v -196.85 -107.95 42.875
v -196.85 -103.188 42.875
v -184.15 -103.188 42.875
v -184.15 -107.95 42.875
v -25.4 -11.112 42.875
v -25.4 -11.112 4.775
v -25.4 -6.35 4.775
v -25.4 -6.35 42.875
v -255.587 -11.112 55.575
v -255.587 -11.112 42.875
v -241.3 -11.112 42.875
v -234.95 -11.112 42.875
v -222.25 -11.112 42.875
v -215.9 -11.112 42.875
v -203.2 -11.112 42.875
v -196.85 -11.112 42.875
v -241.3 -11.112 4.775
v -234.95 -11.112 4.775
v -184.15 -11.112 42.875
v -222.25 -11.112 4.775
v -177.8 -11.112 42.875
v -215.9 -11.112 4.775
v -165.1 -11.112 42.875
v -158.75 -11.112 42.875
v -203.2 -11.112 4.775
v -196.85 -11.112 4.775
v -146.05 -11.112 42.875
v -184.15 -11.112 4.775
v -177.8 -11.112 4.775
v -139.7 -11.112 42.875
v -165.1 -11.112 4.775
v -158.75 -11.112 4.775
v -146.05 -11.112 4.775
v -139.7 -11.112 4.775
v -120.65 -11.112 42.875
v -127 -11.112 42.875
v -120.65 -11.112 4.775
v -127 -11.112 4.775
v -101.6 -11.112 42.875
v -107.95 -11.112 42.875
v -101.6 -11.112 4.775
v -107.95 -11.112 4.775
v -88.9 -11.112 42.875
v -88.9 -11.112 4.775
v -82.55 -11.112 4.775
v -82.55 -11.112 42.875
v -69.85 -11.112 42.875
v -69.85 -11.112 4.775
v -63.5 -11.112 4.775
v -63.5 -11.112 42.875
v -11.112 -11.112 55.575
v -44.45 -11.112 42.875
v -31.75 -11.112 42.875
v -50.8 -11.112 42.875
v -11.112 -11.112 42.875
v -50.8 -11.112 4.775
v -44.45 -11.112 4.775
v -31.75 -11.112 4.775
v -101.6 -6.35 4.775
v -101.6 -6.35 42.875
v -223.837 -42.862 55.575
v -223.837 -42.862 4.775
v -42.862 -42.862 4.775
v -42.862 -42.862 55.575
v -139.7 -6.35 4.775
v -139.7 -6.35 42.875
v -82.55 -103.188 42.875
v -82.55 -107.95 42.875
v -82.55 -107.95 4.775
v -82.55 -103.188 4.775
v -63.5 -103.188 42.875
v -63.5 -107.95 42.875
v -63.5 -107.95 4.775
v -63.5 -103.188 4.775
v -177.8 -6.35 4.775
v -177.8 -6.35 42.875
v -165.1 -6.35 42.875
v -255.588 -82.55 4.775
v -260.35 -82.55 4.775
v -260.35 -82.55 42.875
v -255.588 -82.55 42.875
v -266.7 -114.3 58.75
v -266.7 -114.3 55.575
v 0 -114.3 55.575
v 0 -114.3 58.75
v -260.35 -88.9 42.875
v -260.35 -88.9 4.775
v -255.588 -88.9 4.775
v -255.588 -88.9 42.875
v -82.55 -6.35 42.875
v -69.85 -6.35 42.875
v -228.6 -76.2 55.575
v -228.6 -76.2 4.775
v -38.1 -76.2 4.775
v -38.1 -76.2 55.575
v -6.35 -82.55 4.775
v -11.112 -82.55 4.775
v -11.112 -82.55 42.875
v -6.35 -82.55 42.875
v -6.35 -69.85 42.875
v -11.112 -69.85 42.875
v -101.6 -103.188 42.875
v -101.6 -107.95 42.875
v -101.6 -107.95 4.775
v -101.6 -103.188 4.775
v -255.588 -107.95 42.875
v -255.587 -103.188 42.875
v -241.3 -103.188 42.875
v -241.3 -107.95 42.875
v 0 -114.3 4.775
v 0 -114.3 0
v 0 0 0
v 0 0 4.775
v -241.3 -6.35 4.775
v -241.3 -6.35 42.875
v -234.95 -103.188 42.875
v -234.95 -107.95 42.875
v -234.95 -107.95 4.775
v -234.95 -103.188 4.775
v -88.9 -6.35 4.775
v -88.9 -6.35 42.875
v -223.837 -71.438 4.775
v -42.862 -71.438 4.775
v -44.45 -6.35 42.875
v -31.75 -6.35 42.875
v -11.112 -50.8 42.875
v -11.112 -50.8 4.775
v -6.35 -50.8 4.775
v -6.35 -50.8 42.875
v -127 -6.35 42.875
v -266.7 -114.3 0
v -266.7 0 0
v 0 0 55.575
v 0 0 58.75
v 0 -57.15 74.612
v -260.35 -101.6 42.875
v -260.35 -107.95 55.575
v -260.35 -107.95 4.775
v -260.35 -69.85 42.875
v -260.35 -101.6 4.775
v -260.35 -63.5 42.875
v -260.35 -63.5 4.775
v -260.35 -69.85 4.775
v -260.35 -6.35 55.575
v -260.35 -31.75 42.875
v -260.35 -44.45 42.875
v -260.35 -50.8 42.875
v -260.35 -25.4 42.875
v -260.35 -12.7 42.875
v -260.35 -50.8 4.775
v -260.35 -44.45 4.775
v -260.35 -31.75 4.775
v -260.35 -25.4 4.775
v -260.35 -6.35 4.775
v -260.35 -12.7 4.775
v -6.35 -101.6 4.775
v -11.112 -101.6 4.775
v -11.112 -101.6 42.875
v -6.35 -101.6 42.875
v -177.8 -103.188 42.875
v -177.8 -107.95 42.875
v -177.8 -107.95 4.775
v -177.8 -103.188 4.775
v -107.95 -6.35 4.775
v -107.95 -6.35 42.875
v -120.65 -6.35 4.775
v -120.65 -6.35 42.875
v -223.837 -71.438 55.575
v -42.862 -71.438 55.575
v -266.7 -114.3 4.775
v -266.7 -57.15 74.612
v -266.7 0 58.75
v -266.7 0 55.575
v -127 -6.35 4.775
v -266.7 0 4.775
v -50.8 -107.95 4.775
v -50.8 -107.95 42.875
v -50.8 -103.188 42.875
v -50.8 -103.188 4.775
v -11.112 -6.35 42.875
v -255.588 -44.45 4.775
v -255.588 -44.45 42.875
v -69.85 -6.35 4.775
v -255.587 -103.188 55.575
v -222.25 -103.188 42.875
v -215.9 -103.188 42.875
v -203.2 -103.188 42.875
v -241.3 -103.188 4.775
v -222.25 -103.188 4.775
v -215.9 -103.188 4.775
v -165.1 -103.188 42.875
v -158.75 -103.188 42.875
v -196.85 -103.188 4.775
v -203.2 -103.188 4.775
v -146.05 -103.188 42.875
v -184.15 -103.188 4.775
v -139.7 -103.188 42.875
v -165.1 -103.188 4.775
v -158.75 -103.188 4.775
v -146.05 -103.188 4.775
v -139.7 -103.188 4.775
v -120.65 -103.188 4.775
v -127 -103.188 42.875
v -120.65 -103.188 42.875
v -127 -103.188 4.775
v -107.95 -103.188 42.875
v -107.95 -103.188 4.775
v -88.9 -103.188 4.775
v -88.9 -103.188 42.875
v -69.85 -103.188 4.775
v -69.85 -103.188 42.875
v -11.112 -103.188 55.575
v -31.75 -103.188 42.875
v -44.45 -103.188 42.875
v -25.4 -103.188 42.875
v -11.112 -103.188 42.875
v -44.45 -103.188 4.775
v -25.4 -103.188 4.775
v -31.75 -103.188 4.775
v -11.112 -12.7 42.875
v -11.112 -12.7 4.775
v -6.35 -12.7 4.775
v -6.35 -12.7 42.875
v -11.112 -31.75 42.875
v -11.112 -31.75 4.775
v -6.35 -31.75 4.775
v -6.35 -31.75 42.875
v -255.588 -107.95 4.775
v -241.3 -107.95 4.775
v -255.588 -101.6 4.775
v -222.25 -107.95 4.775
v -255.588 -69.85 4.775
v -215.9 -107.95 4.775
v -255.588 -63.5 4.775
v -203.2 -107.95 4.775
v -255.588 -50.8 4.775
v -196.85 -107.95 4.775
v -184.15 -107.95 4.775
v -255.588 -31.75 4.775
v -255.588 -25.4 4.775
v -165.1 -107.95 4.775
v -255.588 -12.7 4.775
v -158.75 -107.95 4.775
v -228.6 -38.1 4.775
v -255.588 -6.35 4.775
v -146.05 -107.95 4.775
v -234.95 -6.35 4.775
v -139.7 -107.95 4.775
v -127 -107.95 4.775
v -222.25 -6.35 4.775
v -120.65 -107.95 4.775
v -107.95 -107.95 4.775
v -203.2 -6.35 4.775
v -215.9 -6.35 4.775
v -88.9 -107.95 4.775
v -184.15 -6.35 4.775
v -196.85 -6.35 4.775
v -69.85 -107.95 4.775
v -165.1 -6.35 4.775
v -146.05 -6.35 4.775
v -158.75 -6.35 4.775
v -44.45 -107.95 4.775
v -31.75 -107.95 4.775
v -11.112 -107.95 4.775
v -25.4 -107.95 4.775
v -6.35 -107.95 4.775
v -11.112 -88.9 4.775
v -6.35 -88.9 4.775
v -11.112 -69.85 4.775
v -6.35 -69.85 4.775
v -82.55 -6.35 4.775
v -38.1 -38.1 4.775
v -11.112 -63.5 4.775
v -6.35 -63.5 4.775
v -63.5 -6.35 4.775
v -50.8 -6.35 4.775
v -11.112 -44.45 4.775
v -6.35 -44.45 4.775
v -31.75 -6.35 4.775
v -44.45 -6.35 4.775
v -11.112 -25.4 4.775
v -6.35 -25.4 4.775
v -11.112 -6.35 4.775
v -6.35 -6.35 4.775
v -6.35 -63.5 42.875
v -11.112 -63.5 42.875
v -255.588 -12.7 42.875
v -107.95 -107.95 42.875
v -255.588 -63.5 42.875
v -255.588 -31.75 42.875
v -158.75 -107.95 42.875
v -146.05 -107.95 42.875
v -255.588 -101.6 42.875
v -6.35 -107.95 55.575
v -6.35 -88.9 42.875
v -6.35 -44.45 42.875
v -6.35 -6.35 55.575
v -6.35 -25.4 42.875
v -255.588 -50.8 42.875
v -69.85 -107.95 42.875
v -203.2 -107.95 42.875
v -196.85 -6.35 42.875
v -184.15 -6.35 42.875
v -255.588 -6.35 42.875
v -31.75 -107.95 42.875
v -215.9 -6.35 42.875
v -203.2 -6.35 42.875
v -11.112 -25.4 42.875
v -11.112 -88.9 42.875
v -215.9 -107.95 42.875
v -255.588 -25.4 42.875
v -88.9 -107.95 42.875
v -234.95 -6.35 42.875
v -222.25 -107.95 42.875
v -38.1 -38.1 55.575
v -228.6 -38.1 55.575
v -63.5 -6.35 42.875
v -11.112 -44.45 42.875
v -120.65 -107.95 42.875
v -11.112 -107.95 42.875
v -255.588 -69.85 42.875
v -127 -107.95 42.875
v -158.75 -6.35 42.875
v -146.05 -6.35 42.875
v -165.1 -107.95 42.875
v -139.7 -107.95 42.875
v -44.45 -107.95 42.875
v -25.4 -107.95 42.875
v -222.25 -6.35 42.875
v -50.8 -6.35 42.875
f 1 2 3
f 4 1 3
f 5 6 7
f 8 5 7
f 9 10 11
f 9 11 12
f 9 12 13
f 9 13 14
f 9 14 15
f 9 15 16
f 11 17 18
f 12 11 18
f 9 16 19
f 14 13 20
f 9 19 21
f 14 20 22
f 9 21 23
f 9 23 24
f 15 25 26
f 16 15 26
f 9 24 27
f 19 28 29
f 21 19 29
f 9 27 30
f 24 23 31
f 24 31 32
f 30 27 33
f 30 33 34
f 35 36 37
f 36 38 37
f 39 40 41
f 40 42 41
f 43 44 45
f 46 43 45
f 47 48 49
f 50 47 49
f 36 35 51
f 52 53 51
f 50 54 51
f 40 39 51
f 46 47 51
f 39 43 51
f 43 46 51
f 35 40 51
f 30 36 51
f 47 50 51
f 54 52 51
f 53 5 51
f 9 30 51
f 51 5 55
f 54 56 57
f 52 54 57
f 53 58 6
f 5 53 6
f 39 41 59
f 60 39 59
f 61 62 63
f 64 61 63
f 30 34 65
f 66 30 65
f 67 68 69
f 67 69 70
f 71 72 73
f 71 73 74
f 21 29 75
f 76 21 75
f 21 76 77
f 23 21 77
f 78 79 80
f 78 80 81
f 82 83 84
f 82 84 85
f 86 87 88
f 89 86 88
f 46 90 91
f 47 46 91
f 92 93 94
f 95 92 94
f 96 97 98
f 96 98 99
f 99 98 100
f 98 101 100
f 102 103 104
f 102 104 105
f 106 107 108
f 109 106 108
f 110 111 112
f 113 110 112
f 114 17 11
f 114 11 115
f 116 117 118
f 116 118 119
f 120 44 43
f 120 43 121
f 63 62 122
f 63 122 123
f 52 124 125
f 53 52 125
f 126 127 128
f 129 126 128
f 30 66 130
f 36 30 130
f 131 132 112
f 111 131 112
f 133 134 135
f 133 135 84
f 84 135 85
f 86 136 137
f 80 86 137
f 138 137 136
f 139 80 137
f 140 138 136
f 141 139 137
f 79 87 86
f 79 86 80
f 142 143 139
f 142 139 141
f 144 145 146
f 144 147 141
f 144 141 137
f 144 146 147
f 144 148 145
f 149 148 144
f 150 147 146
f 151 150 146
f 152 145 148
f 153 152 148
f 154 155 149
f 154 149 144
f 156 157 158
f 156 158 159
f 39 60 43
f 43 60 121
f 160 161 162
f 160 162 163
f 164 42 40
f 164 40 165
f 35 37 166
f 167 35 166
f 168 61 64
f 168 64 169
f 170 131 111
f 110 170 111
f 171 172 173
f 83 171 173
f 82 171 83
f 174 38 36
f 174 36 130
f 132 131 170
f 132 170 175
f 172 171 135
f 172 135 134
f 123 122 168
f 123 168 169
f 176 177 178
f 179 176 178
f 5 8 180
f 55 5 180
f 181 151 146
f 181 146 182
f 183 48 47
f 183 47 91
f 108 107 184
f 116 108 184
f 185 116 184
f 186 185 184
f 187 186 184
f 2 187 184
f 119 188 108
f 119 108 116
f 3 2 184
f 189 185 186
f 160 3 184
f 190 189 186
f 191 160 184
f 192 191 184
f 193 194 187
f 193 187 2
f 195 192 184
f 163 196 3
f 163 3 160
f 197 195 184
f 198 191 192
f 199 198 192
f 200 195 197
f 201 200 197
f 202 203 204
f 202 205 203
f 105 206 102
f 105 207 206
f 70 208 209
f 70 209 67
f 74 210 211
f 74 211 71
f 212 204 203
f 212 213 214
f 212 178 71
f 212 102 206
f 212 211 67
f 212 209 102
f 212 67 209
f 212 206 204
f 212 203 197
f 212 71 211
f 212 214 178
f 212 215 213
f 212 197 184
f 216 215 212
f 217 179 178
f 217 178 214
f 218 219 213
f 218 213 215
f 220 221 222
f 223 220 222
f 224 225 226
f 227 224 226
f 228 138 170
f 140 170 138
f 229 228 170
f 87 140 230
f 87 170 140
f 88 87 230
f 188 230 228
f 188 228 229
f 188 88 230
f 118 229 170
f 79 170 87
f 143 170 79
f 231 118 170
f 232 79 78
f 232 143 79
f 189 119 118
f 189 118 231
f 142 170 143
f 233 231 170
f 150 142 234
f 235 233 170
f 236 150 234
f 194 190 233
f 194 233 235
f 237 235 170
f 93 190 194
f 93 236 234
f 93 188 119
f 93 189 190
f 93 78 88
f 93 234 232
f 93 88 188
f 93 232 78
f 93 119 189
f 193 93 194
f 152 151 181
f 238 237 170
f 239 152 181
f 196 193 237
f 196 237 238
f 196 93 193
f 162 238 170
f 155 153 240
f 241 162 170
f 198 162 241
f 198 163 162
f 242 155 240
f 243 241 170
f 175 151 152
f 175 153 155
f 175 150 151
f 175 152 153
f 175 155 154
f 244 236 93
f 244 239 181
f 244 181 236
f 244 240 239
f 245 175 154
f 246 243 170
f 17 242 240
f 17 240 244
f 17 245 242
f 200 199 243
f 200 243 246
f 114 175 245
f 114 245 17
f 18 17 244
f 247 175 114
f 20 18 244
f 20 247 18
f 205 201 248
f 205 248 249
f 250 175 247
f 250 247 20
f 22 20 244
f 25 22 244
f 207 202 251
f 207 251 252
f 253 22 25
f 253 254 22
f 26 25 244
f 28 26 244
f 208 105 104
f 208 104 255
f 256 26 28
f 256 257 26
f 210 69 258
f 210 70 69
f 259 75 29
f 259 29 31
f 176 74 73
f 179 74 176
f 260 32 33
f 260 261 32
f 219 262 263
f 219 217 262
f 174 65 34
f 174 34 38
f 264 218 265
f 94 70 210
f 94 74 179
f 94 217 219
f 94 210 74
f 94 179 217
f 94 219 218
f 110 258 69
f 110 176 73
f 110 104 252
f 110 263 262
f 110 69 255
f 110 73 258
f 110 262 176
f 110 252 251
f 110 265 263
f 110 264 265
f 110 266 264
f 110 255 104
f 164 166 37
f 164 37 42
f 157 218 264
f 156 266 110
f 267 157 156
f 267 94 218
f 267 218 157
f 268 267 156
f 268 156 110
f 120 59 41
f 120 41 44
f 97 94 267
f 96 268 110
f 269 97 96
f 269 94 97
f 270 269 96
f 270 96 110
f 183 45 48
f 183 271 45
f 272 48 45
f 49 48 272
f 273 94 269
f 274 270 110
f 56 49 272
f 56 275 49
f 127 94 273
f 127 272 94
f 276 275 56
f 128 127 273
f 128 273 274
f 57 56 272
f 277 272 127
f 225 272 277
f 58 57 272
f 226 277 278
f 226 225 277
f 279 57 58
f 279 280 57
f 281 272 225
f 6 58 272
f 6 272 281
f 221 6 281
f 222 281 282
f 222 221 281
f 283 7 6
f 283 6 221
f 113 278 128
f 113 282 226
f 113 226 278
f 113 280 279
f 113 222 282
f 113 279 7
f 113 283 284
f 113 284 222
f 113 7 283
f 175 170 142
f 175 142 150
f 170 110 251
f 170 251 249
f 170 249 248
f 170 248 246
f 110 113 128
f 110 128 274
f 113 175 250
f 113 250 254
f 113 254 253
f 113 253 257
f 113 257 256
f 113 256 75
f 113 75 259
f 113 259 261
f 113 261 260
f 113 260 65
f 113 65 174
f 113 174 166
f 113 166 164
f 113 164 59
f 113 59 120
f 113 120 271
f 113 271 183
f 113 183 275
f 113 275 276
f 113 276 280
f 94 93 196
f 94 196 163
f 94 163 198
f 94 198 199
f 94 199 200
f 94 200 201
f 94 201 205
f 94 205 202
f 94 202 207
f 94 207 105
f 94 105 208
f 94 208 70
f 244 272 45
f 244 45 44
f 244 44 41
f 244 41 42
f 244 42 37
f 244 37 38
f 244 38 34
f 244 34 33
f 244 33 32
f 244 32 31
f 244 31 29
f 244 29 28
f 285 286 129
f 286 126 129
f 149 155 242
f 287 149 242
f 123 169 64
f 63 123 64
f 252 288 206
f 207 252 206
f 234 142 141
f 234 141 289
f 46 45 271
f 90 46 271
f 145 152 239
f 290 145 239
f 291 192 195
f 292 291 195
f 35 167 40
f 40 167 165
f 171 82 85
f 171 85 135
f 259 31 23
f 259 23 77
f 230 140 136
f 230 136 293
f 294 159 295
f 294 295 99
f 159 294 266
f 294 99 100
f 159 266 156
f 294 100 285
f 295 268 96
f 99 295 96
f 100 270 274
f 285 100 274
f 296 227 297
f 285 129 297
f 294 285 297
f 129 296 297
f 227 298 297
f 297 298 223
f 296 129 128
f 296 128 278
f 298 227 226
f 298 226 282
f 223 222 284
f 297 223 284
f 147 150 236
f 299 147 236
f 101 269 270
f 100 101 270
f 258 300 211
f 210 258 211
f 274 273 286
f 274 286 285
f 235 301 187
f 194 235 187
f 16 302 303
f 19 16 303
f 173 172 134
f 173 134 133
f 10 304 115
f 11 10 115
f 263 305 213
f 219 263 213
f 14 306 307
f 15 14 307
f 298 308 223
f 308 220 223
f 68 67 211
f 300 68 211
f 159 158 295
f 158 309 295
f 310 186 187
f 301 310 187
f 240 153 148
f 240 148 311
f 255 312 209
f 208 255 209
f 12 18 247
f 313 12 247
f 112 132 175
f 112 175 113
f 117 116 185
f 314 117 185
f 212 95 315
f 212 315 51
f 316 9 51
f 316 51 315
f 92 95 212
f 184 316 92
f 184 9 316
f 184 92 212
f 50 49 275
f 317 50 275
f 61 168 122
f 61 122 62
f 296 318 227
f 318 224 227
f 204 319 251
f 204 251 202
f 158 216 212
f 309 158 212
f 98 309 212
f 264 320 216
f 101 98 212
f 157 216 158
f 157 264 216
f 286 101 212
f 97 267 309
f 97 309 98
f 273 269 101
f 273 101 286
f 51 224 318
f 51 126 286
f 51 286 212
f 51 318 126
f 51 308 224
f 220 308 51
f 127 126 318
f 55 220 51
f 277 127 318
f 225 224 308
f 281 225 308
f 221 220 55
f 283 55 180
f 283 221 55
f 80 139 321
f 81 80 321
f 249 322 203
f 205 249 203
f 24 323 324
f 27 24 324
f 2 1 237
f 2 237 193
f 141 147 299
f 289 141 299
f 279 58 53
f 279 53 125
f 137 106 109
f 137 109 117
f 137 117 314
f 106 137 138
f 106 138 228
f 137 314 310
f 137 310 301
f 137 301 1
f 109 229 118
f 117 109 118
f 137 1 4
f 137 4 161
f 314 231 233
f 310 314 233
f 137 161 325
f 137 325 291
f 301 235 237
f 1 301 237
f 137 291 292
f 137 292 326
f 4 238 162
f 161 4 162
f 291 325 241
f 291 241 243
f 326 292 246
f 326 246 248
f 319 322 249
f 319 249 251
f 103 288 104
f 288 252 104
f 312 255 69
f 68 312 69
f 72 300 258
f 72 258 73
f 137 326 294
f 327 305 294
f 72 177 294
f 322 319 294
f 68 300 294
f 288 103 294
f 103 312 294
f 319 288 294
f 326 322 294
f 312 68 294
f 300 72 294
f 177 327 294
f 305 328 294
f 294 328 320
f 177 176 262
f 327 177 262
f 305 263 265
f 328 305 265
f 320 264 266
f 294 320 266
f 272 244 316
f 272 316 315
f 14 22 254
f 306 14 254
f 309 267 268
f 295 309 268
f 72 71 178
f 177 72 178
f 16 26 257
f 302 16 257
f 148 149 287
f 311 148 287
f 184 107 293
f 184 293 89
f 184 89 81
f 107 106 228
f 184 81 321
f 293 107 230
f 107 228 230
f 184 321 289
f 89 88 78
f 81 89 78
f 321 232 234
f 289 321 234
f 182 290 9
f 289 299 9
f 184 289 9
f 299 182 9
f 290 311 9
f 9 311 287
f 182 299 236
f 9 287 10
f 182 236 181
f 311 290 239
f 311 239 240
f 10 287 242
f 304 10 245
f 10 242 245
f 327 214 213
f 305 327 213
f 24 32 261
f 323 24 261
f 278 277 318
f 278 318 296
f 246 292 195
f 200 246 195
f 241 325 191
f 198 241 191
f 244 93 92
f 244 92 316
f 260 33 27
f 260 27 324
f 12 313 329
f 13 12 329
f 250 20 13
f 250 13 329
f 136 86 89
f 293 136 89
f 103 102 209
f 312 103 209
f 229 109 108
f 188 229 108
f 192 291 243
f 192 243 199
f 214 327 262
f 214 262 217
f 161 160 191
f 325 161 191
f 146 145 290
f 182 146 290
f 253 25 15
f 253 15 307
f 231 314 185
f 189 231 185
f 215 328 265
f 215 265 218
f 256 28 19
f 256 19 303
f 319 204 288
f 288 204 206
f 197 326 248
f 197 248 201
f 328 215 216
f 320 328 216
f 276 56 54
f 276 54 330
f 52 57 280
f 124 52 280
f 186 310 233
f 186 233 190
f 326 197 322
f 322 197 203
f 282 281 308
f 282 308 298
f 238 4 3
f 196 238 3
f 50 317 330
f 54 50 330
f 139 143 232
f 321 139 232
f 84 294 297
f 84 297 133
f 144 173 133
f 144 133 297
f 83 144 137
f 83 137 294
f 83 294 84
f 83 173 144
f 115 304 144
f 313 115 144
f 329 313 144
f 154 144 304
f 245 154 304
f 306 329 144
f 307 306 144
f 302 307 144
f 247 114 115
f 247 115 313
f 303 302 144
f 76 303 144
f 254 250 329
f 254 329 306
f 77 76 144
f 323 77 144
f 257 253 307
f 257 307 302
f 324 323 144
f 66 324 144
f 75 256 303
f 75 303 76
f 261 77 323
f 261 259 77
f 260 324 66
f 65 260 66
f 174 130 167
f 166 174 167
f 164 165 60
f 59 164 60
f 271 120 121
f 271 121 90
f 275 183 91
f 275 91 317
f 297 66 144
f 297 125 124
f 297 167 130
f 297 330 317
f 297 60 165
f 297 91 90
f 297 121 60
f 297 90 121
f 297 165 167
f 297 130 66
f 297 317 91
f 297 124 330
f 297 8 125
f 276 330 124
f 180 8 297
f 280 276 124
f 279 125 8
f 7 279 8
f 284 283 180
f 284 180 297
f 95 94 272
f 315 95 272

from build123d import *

# Parameters (mm, degrees)
F0_W     = 266.7
F0_H     = 114.3
F1_DEPTH = 4.7752
F2_W     = 4.7625
F2_H     = 6.35
F2_W_2   = 6.35
F2_H_2   = 4.7625
F3_DEPTH = 38.1
F4_W     = 190.5
F4_H     = 38.1
F4_W_2   = 180.975
F4_H_2   = 28.575
F5_DEPTH = 50.8
F6_W     = 254
F6_H     = 101.6
F6_W_2   = 244.475
F6_H_2   = 92.075
F7_DEPTH = 12.7
F9_DEPTH = 266.7


# Not quite as in the source:
# - a feature names something its author has since deleted; it is built from what else it names


with BuildPart() as f1:
    # F0 (on Top) → F1 (new body)
    with BuildSketch(Plane.XY):
        with Locations((-133.35, -57.15)):
            Rectangle(F0_W, F0_H)
    extrude(amount=F1_DEPTH)

    # F2 (on face) → F3 (join)
    with BuildSketch(Plane.XY.offset(4.7752)):
        with Locations((-257.96875, -104.775)):
            Rectangle(F2_W, F2_H)
        with Locations((-257.96875, -85.725)):
            Rectangle(F2_W, F2_H)
        with Locations((-257.96875, -66.675)):
            Rectangle(F2_W, F2_H)
        with Locations((-257.96875, -47.625)):
            Rectangle(F2_W, F2_H)
        with Locations((-257.96875, -28.575)):
            Rectangle(F2_W, F2_H)
        with Locations((-257.96875, -9.525)):
            Rectangle(F2_W, F2_H)
        with Locations((-238.125, -105.56875)):
            Rectangle(F2_W_2, F2_H_2)
        with Locations((-219.075, -105.56875)):
            Rectangle(F2_W_2, F2_H_2)
        with Locations((-200.025, -105.56875)):
            Rectangle(F2_W_2, F2_H_2)
        with Locations((-180.975, -105.56875)):
            Rectangle(F2_W_2, F2_H_2)
        with Locations((-161.925, -105.56875)):
            Rectangle(F2_W_2, F2_H_2)
        with Locations((-142.875, -105.56875)):
            Rectangle(F2_W_2, F2_H_2)
        with Locations((-123.825, -105.56875)):
            Rectangle(F2_W_2, F2_H_2)
        with Locations((-104.775, -105.56875)):
            Rectangle(F2_W_2, F2_H_2)
        with Locations((-85.725, -105.56875)):
            Rectangle(F2_W_2, F2_H_2)
        with Locations((-66.675, -105.56875)):
            Rectangle(F2_W_2, F2_H_2)
        with Locations((-47.625, -105.56875)):
            Rectangle(F2_W_2, F2_H_2)
        with Locations((-28.575, -105.56875)):
            Rectangle(F2_W_2, F2_H_2)
        with Locations((-8.73125, -104.775)):
            Rectangle(F2_W, F2_H)
        with Locations((-8.73125, -85.725)):
            Rectangle(F2_W, F2_H)
        with Locations((-8.73125, -9.525)):
            Rectangle(F2_W, F2_H)
        with Locations((-8.73125, -28.575)):
            Rectangle(F2_W, F2_H)
        with Locations((-8.73125, -47.625)):
            Rectangle(F2_W, F2_H)
        with Locations((-8.73125, -66.675)):
            Rectangle(F2_W, F2_H)
        with Locations((-123.825, -8.73125)):
            Rectangle(F2_W_2, F2_H_2)
        with Locations((-200.025, -8.73125)):
            Rectangle(F2_W_2, F2_H_2)
        with Locations((-180.975, -8.73125)):
            Rectangle(F2_W_2, F2_H_2)
        with Locations((-28.575, -8.73125)):
            Rectangle(F2_W_2, F2_H_2)
        with Locations((-161.925, -8.73125)):
            Rectangle(F2_W_2, F2_H_2)
        with Locations((-238.125, -8.73125)):
            Rectangle(F2_W_2, F2_H_2)
        with Locations((-85.725, -8.73125)):
            Rectangle(F2_W_2, F2_H_2)
        with Locations((-142.875, -8.73125)):
            Rectangle(F2_W_2, F2_H_2)
        with Locations((-66.675, -8.73125)):
            Rectangle(F2_W_2, F2_H_2)
        with Locations((-219.075, -8.73125)):
            Rectangle(F2_W_2, F2_H_2)
        with Locations((-104.775, -8.73125)):
            Rectangle(F2_W_2, F2_H_2)
        with Locations((-47.625, -8.73125)):
            Rectangle(F2_W_2, F2_H_2)
    extrude(amount=F3_DEPTH)

    # F4 (on face) → F5 (join)
    with BuildSketch(Plane.XY.offset(4.7752)):
        with Locations((-133.35, -57.15)):
            Rectangle(F4_W, F4_H)
        with Locations((-133.35, -57.15)):
            Rectangle(F4_W_2, F4_H_2, mode=Mode.SUBTRACT)
    extrude(amount=F5_DEPTH)

    # F6 (on face) → F7 (join)
    with BuildSketch(Plane.XY.offset(42.8752)):
        with Locations((-133.35, -57.15)):
            Rectangle(F6_W, F6_H)
        with Locations((-133.35, -57.15)):
            Rectangle(F6_W_2, F6_H_2, mode=Mode.SUBTRACT)
    extrude(amount=F7_DEPTH)

    # F8 (on face) → F9 (join, through all)
    with BuildSketch(Plane(origin=(-266.7, 0, 0), x_dir=(0, -1, 0), z_dir=(-1, 0, 0))):
        Polygon((0, 58.7502), (114.3, 58.7502), (57.15, 74.6125), align=None)
        Polygon((6.35, 55.5752), (107.95, 55.5752), (114.3, 55.5752), (114.3, 58.7502), (0, 58.7502), (0, 55.5752), align=None)
    extrude(amount=-F9_DEPTH)


solid = f1.part
